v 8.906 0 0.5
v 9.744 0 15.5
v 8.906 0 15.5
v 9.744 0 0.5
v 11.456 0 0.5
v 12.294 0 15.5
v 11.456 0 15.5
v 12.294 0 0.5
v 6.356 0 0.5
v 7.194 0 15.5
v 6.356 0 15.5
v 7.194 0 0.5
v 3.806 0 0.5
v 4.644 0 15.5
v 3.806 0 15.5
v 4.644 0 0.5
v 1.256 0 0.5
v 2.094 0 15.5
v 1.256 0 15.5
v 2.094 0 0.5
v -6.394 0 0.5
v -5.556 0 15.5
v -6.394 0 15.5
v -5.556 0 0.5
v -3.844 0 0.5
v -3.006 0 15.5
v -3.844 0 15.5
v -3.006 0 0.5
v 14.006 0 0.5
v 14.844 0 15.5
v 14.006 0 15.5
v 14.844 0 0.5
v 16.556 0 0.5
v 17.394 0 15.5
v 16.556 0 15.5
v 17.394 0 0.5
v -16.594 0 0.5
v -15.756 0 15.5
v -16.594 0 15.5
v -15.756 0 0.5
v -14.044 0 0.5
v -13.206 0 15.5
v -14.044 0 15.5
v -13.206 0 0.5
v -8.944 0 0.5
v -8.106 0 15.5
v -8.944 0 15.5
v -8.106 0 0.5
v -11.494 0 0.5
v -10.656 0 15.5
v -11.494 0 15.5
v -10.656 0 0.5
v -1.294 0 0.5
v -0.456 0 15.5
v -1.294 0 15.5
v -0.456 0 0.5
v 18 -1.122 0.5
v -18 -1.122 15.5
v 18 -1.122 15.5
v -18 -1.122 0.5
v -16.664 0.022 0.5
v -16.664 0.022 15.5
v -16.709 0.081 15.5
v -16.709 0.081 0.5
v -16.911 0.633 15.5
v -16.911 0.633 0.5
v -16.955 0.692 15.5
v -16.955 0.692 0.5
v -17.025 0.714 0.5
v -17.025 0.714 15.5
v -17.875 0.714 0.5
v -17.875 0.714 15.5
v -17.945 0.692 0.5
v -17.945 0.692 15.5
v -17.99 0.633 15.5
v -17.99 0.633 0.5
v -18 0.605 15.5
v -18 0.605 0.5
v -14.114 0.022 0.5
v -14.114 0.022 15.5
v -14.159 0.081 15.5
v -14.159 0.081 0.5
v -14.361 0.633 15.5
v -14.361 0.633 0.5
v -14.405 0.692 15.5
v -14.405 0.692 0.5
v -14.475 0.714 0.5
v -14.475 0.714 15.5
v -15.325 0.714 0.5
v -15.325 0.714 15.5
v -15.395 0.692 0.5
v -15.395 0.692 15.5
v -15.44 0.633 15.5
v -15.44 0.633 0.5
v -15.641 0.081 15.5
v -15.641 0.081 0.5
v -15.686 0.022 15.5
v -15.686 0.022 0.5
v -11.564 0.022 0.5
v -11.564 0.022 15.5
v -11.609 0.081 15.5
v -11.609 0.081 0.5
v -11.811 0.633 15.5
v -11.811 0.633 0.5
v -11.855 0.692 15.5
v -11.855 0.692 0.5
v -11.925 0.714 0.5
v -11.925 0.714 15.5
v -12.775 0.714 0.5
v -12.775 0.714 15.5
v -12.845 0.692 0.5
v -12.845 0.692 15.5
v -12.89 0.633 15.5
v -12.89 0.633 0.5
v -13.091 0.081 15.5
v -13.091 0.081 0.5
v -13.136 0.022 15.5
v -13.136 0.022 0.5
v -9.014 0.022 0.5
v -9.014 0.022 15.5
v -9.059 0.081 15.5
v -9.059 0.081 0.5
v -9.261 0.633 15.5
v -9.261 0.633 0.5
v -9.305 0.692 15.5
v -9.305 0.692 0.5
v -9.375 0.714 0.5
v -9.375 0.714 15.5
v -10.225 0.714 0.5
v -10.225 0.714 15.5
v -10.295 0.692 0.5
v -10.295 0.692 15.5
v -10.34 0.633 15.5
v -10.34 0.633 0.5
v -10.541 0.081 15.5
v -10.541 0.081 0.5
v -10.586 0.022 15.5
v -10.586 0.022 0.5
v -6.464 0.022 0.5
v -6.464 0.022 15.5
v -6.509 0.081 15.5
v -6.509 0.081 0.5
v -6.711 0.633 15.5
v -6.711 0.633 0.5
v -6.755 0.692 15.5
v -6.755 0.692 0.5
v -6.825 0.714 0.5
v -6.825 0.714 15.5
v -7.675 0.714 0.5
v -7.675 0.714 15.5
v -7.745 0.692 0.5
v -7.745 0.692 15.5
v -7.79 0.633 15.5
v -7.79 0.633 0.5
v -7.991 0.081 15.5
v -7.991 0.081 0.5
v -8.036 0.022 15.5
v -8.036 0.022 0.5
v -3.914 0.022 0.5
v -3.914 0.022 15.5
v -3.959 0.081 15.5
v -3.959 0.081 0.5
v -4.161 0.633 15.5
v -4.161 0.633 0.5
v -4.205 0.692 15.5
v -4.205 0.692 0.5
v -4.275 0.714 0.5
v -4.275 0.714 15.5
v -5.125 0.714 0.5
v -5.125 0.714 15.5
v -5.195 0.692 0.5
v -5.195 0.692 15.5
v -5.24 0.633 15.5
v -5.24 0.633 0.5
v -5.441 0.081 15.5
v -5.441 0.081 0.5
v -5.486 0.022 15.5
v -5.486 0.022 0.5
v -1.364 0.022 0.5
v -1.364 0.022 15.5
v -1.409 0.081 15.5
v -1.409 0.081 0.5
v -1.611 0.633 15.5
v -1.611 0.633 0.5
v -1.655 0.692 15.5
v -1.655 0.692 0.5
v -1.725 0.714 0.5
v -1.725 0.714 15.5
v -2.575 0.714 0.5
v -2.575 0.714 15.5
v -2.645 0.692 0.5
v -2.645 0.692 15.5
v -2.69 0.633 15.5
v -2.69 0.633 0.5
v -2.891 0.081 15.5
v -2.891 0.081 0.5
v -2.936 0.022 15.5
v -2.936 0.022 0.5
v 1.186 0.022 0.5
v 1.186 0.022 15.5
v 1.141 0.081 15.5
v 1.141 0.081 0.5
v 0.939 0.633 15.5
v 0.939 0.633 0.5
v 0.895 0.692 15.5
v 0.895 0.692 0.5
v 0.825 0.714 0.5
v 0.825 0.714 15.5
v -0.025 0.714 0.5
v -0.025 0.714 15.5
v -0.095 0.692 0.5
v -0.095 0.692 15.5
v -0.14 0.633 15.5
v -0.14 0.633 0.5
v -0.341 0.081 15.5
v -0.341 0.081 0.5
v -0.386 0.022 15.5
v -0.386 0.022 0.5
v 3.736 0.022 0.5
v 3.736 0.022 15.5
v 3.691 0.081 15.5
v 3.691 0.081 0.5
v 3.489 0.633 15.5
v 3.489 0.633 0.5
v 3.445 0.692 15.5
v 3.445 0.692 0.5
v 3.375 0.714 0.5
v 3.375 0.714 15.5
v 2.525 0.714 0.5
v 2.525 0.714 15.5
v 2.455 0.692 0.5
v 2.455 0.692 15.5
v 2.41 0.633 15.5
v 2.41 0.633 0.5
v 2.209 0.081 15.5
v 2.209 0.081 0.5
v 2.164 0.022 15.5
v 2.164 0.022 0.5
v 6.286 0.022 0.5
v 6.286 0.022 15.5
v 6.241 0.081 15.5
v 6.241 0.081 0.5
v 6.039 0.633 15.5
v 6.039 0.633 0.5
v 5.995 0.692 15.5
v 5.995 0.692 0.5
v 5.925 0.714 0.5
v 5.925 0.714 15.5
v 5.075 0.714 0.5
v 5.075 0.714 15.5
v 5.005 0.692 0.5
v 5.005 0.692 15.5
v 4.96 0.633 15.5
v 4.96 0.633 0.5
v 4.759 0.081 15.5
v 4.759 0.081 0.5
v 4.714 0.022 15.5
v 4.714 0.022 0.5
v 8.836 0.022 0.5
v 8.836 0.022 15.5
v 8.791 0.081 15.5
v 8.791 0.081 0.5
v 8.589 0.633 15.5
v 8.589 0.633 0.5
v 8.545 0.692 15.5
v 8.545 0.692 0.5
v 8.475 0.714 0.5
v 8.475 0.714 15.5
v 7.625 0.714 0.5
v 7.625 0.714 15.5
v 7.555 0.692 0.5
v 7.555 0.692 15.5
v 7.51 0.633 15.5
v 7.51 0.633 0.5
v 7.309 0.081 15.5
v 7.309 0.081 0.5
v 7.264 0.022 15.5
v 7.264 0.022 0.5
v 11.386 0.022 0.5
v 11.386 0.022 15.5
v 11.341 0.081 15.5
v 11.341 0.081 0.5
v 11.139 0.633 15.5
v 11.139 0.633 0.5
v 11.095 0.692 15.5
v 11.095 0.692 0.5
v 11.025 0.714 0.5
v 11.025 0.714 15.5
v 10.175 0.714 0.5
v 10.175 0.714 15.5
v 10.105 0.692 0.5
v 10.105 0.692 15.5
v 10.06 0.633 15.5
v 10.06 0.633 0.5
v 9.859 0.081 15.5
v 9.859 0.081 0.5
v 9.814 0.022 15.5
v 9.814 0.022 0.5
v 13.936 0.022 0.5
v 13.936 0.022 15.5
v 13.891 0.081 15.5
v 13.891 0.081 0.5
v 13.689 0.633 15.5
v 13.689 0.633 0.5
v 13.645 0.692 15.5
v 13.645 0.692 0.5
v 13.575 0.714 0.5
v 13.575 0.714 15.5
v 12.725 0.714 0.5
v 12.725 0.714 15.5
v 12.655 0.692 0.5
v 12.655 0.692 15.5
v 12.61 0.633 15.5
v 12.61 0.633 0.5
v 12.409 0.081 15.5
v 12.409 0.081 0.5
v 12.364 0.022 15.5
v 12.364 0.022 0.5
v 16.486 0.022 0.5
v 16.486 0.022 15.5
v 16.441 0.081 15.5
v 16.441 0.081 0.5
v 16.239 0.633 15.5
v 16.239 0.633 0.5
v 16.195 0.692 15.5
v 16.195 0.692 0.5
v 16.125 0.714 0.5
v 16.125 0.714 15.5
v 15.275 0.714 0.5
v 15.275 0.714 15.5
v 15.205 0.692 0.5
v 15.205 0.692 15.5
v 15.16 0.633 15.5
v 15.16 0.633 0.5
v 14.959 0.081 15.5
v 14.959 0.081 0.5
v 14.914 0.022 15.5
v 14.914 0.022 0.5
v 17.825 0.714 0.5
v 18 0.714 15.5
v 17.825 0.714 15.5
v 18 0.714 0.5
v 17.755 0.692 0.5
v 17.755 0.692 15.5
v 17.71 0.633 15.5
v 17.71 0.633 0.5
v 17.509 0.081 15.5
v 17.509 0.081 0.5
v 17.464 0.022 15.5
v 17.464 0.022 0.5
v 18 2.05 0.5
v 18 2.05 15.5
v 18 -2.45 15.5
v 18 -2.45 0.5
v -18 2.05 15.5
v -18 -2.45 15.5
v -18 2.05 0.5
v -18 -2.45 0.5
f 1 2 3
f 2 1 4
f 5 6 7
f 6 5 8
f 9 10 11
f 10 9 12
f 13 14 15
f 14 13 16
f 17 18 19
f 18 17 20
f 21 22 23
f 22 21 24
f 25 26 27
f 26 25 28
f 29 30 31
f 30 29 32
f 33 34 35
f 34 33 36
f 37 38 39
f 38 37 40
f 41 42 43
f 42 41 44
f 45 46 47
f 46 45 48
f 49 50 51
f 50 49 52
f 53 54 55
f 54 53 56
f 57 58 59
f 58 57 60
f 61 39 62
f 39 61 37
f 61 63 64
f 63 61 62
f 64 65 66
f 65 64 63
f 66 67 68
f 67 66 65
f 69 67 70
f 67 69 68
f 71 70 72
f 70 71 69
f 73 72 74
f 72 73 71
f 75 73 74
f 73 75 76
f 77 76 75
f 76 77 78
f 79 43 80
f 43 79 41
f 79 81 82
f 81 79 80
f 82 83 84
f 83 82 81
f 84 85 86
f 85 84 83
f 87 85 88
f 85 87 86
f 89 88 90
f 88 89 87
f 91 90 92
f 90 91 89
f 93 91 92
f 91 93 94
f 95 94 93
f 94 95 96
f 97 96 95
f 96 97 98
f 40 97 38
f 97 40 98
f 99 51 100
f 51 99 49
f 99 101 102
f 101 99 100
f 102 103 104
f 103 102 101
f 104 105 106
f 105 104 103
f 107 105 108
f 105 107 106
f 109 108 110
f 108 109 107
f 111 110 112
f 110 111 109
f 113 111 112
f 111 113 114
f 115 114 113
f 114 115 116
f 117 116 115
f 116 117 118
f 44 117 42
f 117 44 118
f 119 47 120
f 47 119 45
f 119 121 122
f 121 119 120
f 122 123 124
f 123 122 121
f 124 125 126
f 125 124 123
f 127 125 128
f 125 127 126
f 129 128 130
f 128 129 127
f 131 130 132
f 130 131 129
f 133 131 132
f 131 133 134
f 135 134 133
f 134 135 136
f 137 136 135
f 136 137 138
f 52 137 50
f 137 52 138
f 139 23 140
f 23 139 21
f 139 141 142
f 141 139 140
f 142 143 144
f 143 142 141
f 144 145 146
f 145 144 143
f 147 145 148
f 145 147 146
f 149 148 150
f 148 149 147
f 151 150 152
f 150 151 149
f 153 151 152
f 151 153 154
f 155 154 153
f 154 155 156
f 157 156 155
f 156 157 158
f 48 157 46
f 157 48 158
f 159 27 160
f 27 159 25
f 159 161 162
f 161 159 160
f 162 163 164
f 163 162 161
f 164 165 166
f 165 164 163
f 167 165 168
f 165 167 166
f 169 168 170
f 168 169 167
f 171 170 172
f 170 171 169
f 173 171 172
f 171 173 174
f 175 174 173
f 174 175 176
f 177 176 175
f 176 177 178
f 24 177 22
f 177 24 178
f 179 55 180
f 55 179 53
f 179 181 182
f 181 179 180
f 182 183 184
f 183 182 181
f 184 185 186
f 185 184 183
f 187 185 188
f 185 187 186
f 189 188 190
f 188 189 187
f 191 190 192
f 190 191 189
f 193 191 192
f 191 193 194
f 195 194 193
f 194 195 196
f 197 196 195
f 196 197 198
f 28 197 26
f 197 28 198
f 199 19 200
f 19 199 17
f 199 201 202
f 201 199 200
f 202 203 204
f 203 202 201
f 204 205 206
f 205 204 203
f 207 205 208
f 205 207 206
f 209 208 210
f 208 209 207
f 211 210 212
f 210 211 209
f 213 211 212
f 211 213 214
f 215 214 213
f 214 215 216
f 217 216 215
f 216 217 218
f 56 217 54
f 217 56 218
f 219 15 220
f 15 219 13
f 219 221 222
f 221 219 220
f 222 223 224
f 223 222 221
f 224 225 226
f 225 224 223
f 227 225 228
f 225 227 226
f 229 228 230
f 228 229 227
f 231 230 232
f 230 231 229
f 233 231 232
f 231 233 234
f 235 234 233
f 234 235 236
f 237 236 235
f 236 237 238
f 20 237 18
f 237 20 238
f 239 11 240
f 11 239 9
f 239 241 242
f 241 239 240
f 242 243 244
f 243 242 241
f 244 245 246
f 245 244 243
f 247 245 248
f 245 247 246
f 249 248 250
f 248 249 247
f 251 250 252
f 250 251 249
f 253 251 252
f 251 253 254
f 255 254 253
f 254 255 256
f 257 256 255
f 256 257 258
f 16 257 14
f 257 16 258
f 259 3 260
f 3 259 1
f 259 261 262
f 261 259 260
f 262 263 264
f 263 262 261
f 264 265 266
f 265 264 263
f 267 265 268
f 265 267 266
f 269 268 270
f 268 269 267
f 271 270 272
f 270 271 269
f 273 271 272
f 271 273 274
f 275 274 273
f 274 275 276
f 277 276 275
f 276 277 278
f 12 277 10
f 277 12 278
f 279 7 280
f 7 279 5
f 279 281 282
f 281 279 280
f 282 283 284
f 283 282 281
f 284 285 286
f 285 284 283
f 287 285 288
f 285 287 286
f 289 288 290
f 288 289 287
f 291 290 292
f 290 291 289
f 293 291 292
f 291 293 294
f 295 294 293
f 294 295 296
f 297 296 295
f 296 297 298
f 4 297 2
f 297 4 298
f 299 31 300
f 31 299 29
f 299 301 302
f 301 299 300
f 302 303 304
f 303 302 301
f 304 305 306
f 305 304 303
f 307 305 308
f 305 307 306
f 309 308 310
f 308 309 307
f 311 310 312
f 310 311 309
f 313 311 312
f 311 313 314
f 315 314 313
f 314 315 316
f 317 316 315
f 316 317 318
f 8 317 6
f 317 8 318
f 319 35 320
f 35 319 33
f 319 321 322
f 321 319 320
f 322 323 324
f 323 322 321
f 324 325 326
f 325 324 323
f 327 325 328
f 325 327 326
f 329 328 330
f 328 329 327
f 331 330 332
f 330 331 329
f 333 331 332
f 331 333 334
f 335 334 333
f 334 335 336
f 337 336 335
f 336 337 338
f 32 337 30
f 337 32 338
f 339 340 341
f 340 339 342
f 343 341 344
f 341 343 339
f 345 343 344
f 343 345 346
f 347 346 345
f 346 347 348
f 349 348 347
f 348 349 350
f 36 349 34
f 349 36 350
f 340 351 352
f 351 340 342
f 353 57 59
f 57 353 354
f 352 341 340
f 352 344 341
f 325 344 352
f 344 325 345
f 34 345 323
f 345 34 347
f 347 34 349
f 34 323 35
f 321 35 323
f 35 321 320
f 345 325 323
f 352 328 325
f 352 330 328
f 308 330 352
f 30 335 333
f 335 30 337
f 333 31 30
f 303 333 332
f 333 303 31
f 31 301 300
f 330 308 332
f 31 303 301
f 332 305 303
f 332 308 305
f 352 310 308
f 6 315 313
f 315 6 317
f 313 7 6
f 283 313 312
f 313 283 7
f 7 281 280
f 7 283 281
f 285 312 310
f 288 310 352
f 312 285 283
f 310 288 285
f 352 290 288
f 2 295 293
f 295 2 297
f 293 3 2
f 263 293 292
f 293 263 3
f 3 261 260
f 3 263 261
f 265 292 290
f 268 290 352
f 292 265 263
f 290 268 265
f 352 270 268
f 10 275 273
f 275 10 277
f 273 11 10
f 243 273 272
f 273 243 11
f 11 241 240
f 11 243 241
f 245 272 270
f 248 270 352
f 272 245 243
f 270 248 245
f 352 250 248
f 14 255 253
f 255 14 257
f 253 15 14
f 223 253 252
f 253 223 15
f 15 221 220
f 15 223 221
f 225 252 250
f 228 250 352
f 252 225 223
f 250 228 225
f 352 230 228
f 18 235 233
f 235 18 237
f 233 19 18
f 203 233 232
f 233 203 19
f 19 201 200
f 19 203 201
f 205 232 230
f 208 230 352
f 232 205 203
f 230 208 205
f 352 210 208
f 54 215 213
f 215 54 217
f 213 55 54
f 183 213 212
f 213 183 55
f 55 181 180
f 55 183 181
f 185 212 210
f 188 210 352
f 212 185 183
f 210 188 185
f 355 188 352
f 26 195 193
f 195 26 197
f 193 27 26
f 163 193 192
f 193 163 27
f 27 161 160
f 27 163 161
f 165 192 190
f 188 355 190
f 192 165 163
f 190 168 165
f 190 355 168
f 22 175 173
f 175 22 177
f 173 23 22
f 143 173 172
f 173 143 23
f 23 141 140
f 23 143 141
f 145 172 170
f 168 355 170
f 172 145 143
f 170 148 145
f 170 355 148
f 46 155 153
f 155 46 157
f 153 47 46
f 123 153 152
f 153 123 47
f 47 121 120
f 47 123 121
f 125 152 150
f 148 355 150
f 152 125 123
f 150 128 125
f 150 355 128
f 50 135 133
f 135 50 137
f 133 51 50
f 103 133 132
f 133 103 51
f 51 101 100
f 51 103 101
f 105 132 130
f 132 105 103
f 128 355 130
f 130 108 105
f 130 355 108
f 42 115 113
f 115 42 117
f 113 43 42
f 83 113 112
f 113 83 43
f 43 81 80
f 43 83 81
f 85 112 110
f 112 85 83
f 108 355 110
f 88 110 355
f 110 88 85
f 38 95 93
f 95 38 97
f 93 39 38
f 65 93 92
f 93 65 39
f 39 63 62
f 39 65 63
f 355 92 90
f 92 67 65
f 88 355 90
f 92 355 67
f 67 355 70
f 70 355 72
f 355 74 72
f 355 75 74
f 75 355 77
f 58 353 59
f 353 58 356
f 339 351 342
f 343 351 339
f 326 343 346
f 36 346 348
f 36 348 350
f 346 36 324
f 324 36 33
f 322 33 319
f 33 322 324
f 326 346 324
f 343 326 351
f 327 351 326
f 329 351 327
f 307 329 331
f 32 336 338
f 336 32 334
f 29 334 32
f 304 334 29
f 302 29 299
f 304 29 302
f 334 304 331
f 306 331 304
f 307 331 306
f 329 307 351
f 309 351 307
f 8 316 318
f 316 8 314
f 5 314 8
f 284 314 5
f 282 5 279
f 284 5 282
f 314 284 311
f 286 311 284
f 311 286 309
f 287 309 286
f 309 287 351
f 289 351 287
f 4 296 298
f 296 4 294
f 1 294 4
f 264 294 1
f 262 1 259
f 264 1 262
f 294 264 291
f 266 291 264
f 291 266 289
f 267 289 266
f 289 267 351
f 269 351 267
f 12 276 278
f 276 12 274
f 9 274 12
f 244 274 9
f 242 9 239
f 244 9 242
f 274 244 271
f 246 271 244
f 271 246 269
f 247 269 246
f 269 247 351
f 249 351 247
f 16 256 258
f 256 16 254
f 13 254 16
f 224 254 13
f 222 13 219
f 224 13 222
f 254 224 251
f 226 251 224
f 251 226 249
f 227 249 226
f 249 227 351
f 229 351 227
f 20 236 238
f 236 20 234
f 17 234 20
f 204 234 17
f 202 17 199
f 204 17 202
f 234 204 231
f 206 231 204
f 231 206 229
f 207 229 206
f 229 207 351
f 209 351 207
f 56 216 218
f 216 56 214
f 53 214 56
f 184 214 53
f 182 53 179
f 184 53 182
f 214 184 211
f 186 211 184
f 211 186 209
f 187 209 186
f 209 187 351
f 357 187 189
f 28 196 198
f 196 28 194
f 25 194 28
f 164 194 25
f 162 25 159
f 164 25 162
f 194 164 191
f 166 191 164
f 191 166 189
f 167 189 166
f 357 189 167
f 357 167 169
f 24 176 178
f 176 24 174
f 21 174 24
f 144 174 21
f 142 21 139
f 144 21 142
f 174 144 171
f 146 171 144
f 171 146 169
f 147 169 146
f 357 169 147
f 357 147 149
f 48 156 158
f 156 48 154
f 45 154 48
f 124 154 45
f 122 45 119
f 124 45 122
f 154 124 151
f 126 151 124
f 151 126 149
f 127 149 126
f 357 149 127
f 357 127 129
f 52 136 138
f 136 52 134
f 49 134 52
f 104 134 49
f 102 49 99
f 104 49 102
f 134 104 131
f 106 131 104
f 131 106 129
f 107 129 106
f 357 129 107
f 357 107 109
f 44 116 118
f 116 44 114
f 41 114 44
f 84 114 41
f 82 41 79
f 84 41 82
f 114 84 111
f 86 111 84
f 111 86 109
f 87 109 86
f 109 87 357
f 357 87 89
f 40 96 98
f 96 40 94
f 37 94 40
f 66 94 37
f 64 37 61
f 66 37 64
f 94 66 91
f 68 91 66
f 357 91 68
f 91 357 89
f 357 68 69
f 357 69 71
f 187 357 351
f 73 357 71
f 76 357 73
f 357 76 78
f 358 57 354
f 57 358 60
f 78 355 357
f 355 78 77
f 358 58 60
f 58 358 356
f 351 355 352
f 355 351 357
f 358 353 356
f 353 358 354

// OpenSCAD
// Rostock Motor End from Jcrocholl modified by Kolergy to:
//    - Take 12x1000mm smooth rods and KB-12-WW Linear Bearings
//    - Increased base height to locate electronics below the base
//    - Stand on three feets


motor_end_height      =  64;  // Was 44
idler_end_height      =  28;
carriage_height       =  32; // Adapted to cover full length +2 of the Linear bearing
platform_thickness    =   8;
bed_thickness         =  12;
pcb_thickness         =   2;
smooth_rod_length     =1000;
platform_hinge_offset =  33;
carriage_hinge_offset =  22;
tower_radius          = 300;
rod_length            = tower_radius * 1.44;


coupler_w = carriage_height+4;
coupler_h = 4.5;
coupler_d = 15;

belt_w = 15.5;
belt_n = 16;
belt_margin = 0.50;

coupler();

// coupler
module coupler() {
	difference(){
		translate([0,-0.20,-coupler_d/2+belt_w])cube([coupler_w,coupler_h,coupler_d],center=true);
		//for (axis_x = [-1:2:1]) {
			translate([-20,0,-0.01])
				scale(1.02)belt_length(profile = "T2.5", belt_width = belt_w+1, n = belt_n);
		//}
	}
}

module belt() {
	scale(1.02)belt_length(profile = "T2.5", belt_width = belt_w+1, n = belt_n);
}

// belt
//for (axis_x = [-1:2:1]) {
//	translate([2.00*belt_n*axis_x-11.25,0,-0.01])
//		%scale(1.02)belt_length(profile = "T2.5", belt_width = belt_w+1, n = belt_n);
//}

//================================================
// Module Section
//================================================
//Outer Module
module belt_length(profile = "T2.5", belt_width = 6, n = 10)
{

			if ( profile == "T2.5" ) 
				{ 
					_belt_length(
						profile=profile, 
						n = n, 
						belt_width = belt_width,
						tooth_pitch = 2.5,
						backing_thickness = 0.6 + belt_margin
						);
				}
			if ( profile == "T5" ) 
				{ 
					_belt_length(
						profile=profile, 
						n = n, 
						belt_width = belt_width,
						tooth_pitch = 5,
						backing_thickness = 1 + belt_margin
						);
				}
			if ( profile == "T10" ) 
				{ 
					_belt_length(
						profile=profile, 
						n = n, 
						belt_width = belt_width,
						tooth_pitch = 10,
						backing_thickness = 2 + belt_margin
						);
				}
			if ( profile == "MXL" ) 
				{ 
					_belt_length(
						profile=profile, 
						n = n, 
						belt_width = belt_width,
						tooth_pitch = 2.032,
						backing_thickness = 0.64 + belt_margin
						);
				}


}

//inner module
module _belt_length(profile = "T2.5", n = 10, belt_width = 5, tooth_pitch = 2.5, backing_thickness = 0.6)
{

for( i = [0:n])
	{
		union(){

			if ( profile == "T2.5" ) { translate([tooth_pitch*i,0,0])T2_5(width = belt_width);}
			if ( profile == "T5" ) { translate([tooth_pitch*i,0,0])T5(width = belt_width);}
			if ( profile == "T10" ) { translate([tooth_pitch*i,0,0])T10(width = belt_width);}
			if ( profile == "MXL" ) { translate([tooth_pitch*i,0,0])MXL(width = belt_width);}
			translate([(tooth_pitch*i)-(tooth_pitch/2),-backing_thickness,0])cube([tooth_pitch,backing_thickness,belt_width]);
		}
	}
}

//Tooth Form modules - Taken from http://www.thingiverse.com/thing:1662
module T2_5(width = 2)
	{
	linear_extrude(height=width) polygon([[-0.839258,-0.5],[-0.839258,0],[-0.770246,0.021652],[-0.726369,0.079022],[-0.529167,0.620889],[-0.485025,0.67826],[-0.416278,0.699911],[0.416278,0.699911],[0.484849,0.67826],[0.528814,0.620889],[0.726369,0.079022],[0.770114,0.021652],[0.839258,0],[0.839258,-0.5]]);
	}

module T5(width = 2)
	{
	linear_extrude(height=width) polygon([[-1.632126,-0.5],[-1.632126,0],[-1.568549,0.004939],[-1.507539,0.019367],[-1.450023,0.042686],[-1.396912,0.074224],[-1.349125,0.113379],[-1.307581,0.159508],[-1.273186,0.211991],[-1.246868,0.270192],[-1.009802,0.920362],[-0.983414,0.978433],[-0.949018,1.030788],[-0.907524,1.076798],[-0.859829,1.115847],[-0.80682,1.147314],[-0.749402,1.170562],[-0.688471,1.184956],[-0.624921,1.189895],[0.624971,1.189895],[0.688622,1.184956],[0.749607,1.170562],[0.807043,1.147314],[0.860055,1.115847],[0.907754,1.076798],[0.949269,1.030788],[0.9837,0.978433],[1.010193,0.920362],[1.246907,0.270192],[1.273295,0.211991],[1.307726,0.159508],[1.349276,0.113379],[1.397039,0.074224],[1.450111,0.042686],[1.507589,0.019367],[1.568563,0.004939],[1.632126,0],[1.632126,-0.5]]);
	}

module T10(width = 2)
	{
	linear_extrude(height=width) polygon([[-3.06511,-1],[-3.06511,0],[-2.971998,0.007239],[-2.882718,0.028344],[-2.79859,0.062396],[-2.720931,0.108479],[-2.651061,0.165675],[-2.590298,0.233065],[-2.539962,0.309732],[-2.501371,0.394759],[-1.879071,2.105025],[-1.840363,2.190052],[-1.789939,2.266719],[-1.729114,2.334109],[-1.659202,2.391304],[-1.581518,2.437387],[-1.497376,2.47144],[-1.408092,2.492545],[-1.314979,2.499784],[1.314979,2.499784],[1.408091,2.492545],[1.497371,2.47144],[1.581499,2.437387],[1.659158,2.391304],[1.729028,2.334109],[1.789791,2.266719],[1.840127,2.190052],[1.878718,2.105025],[2.501018,0.394759],[2.539726,0.309732],[2.59015,0.233065],[2.650975,0.165675],[2.720887,0.108479],[2.798571,0.062396],[2.882713,0.028344],[2.971997,0.007239],[3.06511,0],[3.06511,-1]]);
	}

module MXL(width = 2)
	{
	linear_extrude(height=width) polygon([[-0.660421,-0.5],[-0.660421,0],[-0.621898,0.006033],[-0.587714,0.023037],[-0.560056,0.049424],[-0.541182,0.083609],[-0.417357,0.424392],[-0.398413,0.458752],[-0.370649,0.48514],[-0.336324,0.502074],[-0.297744,0.508035],[0.297744,0.508035],[0.336268,0.502074],[0.370452,0.48514],[0.39811,0.458752],[0.416983,0.424392],[0.540808,0.083609],[0.559752,0.049424],[0.587516,0.023037],[0.621841,0.006033],[0.660421,0],[0.660421,-0.5]]);
	}
